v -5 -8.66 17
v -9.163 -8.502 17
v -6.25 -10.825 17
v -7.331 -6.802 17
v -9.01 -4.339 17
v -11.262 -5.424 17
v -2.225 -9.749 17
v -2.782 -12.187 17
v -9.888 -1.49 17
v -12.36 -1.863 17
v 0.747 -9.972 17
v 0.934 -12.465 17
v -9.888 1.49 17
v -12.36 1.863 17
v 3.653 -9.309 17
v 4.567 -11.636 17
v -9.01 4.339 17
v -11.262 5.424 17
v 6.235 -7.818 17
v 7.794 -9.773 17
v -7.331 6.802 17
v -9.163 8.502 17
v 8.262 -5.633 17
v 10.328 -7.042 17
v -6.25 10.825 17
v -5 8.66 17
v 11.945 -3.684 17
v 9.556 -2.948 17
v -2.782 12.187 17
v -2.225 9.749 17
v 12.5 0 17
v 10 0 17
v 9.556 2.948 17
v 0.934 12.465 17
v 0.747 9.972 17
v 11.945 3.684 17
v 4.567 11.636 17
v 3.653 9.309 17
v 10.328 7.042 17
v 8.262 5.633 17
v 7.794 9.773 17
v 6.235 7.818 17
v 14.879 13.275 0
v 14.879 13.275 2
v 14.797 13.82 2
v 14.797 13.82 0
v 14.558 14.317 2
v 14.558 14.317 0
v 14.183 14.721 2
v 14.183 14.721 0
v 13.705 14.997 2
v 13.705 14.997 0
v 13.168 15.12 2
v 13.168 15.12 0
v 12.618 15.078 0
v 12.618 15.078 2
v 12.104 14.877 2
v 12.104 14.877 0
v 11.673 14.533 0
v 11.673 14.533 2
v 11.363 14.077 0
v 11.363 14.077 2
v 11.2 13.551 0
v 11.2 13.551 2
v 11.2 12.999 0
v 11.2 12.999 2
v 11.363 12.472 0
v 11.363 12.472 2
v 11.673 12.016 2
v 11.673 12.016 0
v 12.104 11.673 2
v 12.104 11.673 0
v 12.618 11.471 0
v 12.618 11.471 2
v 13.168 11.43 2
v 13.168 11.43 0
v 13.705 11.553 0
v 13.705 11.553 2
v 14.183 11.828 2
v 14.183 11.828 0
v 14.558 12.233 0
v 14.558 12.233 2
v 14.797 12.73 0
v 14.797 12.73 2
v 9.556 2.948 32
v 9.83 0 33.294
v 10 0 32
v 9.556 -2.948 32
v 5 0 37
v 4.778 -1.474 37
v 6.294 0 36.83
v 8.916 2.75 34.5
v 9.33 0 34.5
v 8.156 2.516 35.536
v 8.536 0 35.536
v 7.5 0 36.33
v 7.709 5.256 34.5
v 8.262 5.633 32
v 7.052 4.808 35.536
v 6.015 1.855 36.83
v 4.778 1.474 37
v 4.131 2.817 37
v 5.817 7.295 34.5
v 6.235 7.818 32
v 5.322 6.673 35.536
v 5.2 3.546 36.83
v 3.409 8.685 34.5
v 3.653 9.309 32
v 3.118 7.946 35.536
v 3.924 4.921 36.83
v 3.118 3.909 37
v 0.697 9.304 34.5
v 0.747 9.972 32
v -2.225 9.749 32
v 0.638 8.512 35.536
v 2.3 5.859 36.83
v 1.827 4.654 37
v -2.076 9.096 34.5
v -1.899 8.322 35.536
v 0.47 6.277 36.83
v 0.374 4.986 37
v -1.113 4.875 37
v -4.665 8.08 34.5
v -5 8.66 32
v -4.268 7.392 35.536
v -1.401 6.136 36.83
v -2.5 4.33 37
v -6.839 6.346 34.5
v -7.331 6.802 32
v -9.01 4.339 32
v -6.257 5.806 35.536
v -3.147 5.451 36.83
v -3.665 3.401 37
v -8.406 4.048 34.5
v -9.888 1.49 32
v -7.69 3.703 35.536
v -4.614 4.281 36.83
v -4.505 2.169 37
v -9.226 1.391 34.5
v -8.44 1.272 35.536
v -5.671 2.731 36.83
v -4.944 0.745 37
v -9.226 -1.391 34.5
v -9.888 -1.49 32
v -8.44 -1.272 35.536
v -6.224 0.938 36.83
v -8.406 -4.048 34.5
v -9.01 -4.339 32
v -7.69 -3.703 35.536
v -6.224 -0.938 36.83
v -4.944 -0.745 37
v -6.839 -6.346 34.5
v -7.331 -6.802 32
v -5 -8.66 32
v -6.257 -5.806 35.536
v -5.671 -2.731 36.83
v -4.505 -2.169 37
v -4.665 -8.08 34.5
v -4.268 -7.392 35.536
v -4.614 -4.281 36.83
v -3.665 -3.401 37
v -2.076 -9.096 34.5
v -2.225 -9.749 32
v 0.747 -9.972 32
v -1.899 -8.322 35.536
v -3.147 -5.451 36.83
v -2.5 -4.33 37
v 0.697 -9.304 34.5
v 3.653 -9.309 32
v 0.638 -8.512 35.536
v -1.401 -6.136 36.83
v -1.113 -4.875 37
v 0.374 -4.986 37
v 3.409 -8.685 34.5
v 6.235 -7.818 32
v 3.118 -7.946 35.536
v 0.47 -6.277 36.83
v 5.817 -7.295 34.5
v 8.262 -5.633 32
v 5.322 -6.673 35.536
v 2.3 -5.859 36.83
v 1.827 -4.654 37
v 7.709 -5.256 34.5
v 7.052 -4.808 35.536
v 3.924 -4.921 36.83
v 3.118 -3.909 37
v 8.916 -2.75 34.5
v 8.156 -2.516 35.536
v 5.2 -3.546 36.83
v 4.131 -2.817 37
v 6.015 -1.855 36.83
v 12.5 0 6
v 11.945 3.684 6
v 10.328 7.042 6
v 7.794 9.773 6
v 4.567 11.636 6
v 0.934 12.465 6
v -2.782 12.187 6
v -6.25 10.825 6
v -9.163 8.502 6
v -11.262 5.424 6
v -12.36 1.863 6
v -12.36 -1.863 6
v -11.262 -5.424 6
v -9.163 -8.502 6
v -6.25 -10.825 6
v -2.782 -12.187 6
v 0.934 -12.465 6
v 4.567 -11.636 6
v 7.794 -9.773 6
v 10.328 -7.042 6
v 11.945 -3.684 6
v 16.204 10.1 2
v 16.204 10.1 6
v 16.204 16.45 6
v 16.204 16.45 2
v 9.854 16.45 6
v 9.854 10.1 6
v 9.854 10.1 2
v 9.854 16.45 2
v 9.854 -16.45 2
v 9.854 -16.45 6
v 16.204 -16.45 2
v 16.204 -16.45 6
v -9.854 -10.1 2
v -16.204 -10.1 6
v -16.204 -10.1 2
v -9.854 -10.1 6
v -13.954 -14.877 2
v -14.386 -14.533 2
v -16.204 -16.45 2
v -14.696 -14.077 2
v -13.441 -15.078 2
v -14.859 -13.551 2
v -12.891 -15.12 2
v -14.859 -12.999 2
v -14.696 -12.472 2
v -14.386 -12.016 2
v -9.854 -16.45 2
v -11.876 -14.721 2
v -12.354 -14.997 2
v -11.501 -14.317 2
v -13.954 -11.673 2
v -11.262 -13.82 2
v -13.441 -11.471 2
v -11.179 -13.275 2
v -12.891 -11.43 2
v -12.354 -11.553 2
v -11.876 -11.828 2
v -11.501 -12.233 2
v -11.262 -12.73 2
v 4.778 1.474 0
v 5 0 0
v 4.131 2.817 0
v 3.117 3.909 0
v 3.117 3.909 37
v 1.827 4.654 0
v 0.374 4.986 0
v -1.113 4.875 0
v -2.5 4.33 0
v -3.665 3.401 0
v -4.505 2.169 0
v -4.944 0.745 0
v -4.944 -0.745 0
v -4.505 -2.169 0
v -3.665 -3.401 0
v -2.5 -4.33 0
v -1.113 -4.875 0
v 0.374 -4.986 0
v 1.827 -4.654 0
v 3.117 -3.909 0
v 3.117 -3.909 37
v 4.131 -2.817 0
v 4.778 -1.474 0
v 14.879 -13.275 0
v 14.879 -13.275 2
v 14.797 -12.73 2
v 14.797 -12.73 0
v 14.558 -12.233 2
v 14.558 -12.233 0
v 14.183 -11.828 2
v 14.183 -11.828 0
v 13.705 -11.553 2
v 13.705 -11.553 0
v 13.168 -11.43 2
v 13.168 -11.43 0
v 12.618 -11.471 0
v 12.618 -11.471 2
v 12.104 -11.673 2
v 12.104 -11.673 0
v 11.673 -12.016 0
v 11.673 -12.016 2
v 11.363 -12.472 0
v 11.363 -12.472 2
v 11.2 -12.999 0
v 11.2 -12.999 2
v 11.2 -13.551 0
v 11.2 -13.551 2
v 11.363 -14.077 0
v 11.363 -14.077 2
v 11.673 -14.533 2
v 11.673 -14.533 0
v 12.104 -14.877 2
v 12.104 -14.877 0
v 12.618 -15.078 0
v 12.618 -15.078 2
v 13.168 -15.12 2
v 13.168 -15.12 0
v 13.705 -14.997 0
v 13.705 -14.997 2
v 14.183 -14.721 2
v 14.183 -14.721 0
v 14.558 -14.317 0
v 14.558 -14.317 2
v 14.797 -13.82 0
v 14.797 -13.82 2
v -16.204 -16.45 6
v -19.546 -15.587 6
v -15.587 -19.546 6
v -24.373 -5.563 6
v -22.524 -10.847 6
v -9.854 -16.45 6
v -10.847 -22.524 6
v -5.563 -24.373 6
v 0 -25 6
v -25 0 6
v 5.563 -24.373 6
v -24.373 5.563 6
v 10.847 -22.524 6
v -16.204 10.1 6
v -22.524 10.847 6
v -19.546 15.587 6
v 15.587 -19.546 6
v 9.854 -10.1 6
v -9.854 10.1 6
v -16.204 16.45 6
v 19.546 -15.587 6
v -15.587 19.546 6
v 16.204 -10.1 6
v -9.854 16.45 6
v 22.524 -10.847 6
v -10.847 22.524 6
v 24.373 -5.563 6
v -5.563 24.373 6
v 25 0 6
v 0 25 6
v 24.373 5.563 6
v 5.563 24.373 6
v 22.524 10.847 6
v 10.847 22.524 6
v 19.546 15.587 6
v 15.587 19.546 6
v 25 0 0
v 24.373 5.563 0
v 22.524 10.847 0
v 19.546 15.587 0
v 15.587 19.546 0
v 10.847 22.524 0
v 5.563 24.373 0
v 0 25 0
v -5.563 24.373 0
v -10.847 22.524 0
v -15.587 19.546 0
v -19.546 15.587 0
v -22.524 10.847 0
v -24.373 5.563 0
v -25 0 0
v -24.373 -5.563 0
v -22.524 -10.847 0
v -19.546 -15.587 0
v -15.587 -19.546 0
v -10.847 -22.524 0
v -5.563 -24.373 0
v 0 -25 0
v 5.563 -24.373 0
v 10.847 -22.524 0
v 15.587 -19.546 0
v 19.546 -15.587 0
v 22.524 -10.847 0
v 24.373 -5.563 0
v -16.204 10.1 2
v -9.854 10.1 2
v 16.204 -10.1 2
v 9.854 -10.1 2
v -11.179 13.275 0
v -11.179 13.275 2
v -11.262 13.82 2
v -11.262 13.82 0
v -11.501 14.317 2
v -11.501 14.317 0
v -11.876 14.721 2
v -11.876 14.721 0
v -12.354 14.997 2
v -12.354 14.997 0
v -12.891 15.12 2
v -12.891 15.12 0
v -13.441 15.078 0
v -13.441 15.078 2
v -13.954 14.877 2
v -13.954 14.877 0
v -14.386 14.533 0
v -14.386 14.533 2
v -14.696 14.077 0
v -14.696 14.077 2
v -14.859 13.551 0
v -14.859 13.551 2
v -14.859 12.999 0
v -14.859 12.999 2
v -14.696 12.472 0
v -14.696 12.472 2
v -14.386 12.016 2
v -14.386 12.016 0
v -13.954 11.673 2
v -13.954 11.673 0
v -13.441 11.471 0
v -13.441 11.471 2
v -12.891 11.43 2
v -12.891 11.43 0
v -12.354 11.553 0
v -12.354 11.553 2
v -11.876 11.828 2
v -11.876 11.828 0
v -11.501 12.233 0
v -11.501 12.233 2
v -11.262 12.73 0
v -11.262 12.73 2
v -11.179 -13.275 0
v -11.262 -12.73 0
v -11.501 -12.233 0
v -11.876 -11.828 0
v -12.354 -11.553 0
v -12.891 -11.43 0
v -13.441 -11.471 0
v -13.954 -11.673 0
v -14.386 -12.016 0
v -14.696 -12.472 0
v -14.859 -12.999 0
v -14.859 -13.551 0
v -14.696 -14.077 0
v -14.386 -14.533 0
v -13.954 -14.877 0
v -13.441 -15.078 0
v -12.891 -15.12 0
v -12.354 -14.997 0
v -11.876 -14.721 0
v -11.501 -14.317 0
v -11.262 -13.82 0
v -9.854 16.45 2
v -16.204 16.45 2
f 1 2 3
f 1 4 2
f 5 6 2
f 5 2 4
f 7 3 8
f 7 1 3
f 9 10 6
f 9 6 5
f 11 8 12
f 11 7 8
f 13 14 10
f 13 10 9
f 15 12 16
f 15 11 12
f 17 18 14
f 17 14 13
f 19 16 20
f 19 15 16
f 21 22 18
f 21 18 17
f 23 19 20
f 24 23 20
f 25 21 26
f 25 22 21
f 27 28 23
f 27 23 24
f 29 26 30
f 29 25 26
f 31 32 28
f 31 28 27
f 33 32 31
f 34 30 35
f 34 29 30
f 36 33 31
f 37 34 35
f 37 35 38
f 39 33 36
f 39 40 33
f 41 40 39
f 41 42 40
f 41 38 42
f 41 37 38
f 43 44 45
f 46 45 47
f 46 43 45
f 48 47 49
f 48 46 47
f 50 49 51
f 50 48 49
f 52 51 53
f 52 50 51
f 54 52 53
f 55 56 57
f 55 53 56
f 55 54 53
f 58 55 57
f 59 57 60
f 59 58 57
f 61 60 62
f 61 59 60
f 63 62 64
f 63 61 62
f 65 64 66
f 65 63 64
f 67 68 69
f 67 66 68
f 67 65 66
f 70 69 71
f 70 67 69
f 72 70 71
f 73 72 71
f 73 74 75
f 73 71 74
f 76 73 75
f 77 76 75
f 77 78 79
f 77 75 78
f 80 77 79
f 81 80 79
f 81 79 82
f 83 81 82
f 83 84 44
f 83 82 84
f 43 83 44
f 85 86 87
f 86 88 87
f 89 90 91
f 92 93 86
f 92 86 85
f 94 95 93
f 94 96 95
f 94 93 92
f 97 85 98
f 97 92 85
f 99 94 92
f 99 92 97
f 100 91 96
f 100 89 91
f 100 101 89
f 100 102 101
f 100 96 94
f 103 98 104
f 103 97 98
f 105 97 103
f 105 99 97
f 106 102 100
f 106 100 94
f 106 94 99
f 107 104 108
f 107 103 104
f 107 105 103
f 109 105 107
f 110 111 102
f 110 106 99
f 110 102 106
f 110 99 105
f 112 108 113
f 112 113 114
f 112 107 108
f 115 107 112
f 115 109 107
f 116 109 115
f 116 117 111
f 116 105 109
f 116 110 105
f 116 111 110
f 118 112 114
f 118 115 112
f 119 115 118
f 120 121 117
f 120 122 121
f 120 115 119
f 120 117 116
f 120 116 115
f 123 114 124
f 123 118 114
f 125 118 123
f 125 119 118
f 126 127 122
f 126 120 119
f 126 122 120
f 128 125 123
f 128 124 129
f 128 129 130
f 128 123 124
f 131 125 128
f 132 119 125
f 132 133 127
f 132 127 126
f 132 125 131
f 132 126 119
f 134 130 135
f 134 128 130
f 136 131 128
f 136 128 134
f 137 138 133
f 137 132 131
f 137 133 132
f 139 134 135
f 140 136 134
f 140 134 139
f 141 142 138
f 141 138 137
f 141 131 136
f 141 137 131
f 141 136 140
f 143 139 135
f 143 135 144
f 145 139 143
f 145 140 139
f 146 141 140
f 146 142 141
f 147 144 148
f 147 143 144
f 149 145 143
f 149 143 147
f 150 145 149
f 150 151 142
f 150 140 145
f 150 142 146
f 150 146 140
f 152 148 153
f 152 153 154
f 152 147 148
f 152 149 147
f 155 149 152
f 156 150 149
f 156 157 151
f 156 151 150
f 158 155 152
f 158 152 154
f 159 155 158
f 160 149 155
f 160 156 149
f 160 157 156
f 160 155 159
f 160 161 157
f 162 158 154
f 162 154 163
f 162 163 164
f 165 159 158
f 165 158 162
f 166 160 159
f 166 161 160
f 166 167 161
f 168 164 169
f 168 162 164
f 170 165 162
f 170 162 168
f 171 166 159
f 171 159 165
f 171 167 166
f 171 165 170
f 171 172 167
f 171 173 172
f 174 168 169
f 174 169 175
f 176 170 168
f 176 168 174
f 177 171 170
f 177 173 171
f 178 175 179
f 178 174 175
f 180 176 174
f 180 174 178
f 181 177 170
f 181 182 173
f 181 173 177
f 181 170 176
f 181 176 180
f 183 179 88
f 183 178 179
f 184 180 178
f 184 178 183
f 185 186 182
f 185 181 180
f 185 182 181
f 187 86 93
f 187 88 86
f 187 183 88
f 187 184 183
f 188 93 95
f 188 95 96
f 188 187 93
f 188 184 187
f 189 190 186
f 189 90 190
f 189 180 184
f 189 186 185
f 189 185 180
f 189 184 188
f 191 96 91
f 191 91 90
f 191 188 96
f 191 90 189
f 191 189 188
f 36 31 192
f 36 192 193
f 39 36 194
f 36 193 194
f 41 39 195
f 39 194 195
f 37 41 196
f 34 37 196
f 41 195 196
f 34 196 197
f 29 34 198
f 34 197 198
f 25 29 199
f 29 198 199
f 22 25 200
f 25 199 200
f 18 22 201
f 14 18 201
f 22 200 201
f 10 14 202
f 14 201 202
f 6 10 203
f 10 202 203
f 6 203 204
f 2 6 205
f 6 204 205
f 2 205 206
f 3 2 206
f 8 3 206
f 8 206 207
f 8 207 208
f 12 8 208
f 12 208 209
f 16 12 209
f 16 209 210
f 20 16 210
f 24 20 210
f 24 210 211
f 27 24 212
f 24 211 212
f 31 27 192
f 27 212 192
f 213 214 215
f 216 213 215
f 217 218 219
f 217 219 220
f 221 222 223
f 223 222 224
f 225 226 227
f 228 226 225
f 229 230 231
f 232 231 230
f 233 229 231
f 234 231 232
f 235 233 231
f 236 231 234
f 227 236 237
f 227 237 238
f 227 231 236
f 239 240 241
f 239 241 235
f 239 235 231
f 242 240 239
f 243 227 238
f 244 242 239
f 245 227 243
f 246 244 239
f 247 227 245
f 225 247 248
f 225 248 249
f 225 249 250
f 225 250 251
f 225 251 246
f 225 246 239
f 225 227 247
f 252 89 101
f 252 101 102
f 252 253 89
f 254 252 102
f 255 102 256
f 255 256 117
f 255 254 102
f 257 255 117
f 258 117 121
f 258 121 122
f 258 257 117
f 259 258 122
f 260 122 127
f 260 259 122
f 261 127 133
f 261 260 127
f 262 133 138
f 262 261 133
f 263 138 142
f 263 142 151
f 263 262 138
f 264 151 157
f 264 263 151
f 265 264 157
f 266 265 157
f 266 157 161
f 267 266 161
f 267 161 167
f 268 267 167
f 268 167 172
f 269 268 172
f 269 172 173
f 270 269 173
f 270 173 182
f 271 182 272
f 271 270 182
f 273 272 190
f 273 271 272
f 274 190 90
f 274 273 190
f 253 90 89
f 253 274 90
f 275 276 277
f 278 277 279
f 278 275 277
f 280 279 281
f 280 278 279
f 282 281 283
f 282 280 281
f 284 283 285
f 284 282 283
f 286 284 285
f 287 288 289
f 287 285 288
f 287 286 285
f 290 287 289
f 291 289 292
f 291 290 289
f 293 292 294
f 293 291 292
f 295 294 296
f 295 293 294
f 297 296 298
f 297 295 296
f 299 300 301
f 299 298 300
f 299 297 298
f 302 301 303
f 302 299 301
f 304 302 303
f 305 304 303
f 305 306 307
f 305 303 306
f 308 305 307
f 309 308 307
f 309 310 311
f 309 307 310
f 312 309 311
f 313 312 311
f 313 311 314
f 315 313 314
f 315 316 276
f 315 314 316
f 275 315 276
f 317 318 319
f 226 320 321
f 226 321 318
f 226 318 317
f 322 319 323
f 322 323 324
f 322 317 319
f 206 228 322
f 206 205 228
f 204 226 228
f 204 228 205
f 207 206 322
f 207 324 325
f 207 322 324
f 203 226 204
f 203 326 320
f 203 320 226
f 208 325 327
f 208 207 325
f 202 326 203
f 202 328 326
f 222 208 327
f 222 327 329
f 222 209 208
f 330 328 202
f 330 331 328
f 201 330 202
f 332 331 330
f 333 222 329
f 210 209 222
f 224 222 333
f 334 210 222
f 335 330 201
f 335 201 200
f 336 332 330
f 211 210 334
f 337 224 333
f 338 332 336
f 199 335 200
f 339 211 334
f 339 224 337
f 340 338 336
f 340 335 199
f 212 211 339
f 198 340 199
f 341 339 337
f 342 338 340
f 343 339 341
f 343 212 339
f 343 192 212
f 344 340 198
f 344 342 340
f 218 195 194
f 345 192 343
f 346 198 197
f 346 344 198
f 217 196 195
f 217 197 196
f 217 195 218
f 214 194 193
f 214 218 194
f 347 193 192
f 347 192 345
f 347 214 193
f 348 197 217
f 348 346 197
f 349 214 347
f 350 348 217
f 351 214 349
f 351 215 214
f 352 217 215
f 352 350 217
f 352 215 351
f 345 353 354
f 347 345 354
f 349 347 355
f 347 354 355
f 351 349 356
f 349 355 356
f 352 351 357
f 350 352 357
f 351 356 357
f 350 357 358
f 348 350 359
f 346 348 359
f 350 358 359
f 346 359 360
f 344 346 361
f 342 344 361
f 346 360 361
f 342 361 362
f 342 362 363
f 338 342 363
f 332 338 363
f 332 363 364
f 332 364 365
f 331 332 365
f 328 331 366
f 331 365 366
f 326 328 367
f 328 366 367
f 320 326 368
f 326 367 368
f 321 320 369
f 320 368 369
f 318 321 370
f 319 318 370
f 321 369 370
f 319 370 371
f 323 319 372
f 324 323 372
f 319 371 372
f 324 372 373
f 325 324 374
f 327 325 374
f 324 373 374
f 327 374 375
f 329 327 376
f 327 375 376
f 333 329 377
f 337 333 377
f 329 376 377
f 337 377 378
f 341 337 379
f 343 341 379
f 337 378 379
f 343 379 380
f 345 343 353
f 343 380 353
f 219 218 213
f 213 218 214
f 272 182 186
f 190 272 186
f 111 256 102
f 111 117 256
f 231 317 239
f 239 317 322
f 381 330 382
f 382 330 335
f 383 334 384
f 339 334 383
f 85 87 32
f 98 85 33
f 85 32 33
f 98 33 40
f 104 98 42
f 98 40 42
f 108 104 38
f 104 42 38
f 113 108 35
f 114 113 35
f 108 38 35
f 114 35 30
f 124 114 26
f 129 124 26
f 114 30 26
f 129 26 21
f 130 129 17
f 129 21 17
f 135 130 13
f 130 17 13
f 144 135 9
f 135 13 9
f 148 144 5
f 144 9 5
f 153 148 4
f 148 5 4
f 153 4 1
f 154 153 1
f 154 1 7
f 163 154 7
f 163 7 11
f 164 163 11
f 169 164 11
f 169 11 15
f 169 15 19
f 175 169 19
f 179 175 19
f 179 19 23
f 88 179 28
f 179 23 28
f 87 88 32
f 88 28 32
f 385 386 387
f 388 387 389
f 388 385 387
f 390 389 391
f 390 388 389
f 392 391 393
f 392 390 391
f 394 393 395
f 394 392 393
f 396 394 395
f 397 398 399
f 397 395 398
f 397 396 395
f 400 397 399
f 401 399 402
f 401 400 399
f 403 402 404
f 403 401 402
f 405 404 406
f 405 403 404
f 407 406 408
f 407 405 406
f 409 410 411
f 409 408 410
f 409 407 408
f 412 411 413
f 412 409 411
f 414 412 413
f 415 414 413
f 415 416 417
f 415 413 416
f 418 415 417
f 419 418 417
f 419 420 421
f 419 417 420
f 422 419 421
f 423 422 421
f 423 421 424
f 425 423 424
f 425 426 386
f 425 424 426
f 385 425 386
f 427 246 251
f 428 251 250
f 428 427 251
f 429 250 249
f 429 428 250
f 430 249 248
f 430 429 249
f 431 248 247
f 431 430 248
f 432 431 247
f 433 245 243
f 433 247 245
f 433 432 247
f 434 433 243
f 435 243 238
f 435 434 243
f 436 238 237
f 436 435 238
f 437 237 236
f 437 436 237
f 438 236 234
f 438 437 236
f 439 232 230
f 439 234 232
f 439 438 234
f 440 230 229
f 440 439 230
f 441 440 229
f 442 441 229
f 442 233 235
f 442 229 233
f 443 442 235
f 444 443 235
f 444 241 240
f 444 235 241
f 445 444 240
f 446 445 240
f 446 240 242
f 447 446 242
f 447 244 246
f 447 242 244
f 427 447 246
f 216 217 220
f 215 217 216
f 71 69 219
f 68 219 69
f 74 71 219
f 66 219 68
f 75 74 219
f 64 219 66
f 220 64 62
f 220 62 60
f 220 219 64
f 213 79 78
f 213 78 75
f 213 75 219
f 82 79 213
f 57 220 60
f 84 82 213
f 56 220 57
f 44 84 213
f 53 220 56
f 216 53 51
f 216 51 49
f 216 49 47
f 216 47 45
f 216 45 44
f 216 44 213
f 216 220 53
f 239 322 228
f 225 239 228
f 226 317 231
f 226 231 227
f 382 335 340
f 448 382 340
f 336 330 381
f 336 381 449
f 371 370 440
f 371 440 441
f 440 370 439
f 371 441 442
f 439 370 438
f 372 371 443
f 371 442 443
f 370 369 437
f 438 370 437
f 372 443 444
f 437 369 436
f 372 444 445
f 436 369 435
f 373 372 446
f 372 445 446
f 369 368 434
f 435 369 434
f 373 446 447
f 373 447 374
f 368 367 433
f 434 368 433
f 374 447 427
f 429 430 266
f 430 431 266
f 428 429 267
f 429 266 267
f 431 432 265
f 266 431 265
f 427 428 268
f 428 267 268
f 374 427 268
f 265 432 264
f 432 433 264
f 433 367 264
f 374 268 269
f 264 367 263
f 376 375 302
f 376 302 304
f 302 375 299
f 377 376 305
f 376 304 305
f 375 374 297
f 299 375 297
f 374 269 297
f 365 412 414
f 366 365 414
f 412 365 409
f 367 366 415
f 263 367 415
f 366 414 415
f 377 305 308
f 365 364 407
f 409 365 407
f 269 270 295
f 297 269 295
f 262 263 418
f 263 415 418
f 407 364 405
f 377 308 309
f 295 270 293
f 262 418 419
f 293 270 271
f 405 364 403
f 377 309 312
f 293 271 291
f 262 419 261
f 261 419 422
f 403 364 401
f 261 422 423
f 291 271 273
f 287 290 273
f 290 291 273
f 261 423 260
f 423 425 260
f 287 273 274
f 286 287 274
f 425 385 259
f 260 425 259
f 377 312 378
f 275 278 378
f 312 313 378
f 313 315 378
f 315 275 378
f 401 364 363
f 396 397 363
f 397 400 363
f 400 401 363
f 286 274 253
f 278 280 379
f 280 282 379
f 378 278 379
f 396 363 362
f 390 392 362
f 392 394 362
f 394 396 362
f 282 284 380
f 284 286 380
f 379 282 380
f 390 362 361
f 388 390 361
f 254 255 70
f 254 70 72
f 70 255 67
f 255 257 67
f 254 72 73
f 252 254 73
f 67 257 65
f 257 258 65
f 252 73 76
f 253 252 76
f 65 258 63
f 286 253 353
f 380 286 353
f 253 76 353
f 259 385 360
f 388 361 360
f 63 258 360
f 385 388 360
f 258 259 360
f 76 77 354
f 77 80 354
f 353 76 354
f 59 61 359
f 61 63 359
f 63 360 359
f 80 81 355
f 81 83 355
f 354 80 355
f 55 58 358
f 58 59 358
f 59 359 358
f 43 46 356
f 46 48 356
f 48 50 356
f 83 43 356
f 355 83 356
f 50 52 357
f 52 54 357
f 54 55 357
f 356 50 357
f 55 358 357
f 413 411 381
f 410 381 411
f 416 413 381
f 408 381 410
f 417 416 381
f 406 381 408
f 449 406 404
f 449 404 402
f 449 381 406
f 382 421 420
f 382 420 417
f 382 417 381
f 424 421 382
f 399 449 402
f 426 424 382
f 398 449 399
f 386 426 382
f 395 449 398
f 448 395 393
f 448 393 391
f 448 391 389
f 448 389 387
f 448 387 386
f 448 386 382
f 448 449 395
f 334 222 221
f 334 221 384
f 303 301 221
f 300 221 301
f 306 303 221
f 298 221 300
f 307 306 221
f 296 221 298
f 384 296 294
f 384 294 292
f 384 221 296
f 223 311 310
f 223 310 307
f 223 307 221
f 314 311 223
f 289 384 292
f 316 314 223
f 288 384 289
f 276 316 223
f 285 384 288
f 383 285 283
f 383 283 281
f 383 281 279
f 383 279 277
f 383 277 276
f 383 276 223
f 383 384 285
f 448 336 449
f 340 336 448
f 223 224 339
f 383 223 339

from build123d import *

# Parameters (mm, degrees)
SKETCH1_R           = 25
SKETCH1_R_2         = 1.85
SKETCH1_R_3         = 5
BOSS_EXTRUDE1_DEPTH = 6
SKETCH2_R           = 12.5
SKETCH2_R_2         = 5
BOSS_EXTRUDE2_DEPTH = 11
SKETCH3_R           = 10
SKETCH3_R_2         = 5
BOSS_EXTRUDE3_DEPTH = 20
FILLET1_R           = 5
SKETCH4_W           = 6.35
SKETCH4_H           = 6.35
CUT_EXTRUDE1_DEPTH  = 4


with BuildPart() as part:
    # Sketch1 → Boss-Extrude1 (new body)
    with BuildSketch(Plane.XY):
        Circle(SKETCH1_R)
        with Locations((-13.029498672, -13.274798425)):
            Circle(SKETCH1_R_2, mode=Mode.SUBTRACT)
        with Locations((13.029498672, -13.274798425)):
            Circle(SKETCH1_R_2, mode=Mode.SUBTRACT)
        with Locations((13.029498672, 13.274798425)):
            Circle(SKETCH1_R_2, mode=Mode.SUBTRACT)
        with Locations((-13.029498672, 13.274798425)):
            Circle(SKETCH1_R_2, mode=Mode.SUBTRACT)
        Circle(SKETCH1_R_3, mode=Mode.SUBTRACT)
    extrude(amount=BOSS_EXTRUDE1_DEPTH)

    # Sketch2 → Boss-Extrude2 (add)
    with BuildSketch(Plane.XY.offset(6)):
        Circle(SKETCH2_R)
        Circle(SKETCH2_R_2, mode=Mode.SUBTRACT)
    extrude(amount=BOSS_EXTRUDE2_DEPTH)

    # Sketch3 → Boss-Extrude3 (add)
    with BuildSketch(Plane.XY.offset(17)):
        Circle(SKETCH3_R)
        Circle(SKETCH3_R_2, mode=Mode.SUBTRACT)
    extrude(amount=BOSS_EXTRUDE3_DEPTH)

    # Fillet1
    fillet1_edges = [part.edges().sort_by_distance(p)[0] for p in [
        (-10, 0, 37),
    ]]
    fillet(fillet1_edges, radius=FILLET1_R - 0.0001)  # a hair under: the kernel refuses the full size

    # Sketch4 → Cut-Extrude1 (cut)
    with BuildSketch(Plane.XY.offset(6)):
        with Locations((13.029498672, -13.274798425)):
            Rectangle(SKETCH4_W, SKETCH4_H)
        with Locations((13.029498672, 13.274798425)):
            Rectangle(SKETCH4_W, SKETCH4_H)
        with Locations((-13.029498672, 13.274798425)):
            Rectangle(SKETCH4_W, SKETCH4_H)
        with Locations((-13.029498672, -13.274798425)):
            Rectangle(SKETCH4_W, SKETCH4_H)
    extrude(amount=-CUT_EXTRUDE1_DEPTH, mode=Mode.SUBTRACT)


solid = part.part
